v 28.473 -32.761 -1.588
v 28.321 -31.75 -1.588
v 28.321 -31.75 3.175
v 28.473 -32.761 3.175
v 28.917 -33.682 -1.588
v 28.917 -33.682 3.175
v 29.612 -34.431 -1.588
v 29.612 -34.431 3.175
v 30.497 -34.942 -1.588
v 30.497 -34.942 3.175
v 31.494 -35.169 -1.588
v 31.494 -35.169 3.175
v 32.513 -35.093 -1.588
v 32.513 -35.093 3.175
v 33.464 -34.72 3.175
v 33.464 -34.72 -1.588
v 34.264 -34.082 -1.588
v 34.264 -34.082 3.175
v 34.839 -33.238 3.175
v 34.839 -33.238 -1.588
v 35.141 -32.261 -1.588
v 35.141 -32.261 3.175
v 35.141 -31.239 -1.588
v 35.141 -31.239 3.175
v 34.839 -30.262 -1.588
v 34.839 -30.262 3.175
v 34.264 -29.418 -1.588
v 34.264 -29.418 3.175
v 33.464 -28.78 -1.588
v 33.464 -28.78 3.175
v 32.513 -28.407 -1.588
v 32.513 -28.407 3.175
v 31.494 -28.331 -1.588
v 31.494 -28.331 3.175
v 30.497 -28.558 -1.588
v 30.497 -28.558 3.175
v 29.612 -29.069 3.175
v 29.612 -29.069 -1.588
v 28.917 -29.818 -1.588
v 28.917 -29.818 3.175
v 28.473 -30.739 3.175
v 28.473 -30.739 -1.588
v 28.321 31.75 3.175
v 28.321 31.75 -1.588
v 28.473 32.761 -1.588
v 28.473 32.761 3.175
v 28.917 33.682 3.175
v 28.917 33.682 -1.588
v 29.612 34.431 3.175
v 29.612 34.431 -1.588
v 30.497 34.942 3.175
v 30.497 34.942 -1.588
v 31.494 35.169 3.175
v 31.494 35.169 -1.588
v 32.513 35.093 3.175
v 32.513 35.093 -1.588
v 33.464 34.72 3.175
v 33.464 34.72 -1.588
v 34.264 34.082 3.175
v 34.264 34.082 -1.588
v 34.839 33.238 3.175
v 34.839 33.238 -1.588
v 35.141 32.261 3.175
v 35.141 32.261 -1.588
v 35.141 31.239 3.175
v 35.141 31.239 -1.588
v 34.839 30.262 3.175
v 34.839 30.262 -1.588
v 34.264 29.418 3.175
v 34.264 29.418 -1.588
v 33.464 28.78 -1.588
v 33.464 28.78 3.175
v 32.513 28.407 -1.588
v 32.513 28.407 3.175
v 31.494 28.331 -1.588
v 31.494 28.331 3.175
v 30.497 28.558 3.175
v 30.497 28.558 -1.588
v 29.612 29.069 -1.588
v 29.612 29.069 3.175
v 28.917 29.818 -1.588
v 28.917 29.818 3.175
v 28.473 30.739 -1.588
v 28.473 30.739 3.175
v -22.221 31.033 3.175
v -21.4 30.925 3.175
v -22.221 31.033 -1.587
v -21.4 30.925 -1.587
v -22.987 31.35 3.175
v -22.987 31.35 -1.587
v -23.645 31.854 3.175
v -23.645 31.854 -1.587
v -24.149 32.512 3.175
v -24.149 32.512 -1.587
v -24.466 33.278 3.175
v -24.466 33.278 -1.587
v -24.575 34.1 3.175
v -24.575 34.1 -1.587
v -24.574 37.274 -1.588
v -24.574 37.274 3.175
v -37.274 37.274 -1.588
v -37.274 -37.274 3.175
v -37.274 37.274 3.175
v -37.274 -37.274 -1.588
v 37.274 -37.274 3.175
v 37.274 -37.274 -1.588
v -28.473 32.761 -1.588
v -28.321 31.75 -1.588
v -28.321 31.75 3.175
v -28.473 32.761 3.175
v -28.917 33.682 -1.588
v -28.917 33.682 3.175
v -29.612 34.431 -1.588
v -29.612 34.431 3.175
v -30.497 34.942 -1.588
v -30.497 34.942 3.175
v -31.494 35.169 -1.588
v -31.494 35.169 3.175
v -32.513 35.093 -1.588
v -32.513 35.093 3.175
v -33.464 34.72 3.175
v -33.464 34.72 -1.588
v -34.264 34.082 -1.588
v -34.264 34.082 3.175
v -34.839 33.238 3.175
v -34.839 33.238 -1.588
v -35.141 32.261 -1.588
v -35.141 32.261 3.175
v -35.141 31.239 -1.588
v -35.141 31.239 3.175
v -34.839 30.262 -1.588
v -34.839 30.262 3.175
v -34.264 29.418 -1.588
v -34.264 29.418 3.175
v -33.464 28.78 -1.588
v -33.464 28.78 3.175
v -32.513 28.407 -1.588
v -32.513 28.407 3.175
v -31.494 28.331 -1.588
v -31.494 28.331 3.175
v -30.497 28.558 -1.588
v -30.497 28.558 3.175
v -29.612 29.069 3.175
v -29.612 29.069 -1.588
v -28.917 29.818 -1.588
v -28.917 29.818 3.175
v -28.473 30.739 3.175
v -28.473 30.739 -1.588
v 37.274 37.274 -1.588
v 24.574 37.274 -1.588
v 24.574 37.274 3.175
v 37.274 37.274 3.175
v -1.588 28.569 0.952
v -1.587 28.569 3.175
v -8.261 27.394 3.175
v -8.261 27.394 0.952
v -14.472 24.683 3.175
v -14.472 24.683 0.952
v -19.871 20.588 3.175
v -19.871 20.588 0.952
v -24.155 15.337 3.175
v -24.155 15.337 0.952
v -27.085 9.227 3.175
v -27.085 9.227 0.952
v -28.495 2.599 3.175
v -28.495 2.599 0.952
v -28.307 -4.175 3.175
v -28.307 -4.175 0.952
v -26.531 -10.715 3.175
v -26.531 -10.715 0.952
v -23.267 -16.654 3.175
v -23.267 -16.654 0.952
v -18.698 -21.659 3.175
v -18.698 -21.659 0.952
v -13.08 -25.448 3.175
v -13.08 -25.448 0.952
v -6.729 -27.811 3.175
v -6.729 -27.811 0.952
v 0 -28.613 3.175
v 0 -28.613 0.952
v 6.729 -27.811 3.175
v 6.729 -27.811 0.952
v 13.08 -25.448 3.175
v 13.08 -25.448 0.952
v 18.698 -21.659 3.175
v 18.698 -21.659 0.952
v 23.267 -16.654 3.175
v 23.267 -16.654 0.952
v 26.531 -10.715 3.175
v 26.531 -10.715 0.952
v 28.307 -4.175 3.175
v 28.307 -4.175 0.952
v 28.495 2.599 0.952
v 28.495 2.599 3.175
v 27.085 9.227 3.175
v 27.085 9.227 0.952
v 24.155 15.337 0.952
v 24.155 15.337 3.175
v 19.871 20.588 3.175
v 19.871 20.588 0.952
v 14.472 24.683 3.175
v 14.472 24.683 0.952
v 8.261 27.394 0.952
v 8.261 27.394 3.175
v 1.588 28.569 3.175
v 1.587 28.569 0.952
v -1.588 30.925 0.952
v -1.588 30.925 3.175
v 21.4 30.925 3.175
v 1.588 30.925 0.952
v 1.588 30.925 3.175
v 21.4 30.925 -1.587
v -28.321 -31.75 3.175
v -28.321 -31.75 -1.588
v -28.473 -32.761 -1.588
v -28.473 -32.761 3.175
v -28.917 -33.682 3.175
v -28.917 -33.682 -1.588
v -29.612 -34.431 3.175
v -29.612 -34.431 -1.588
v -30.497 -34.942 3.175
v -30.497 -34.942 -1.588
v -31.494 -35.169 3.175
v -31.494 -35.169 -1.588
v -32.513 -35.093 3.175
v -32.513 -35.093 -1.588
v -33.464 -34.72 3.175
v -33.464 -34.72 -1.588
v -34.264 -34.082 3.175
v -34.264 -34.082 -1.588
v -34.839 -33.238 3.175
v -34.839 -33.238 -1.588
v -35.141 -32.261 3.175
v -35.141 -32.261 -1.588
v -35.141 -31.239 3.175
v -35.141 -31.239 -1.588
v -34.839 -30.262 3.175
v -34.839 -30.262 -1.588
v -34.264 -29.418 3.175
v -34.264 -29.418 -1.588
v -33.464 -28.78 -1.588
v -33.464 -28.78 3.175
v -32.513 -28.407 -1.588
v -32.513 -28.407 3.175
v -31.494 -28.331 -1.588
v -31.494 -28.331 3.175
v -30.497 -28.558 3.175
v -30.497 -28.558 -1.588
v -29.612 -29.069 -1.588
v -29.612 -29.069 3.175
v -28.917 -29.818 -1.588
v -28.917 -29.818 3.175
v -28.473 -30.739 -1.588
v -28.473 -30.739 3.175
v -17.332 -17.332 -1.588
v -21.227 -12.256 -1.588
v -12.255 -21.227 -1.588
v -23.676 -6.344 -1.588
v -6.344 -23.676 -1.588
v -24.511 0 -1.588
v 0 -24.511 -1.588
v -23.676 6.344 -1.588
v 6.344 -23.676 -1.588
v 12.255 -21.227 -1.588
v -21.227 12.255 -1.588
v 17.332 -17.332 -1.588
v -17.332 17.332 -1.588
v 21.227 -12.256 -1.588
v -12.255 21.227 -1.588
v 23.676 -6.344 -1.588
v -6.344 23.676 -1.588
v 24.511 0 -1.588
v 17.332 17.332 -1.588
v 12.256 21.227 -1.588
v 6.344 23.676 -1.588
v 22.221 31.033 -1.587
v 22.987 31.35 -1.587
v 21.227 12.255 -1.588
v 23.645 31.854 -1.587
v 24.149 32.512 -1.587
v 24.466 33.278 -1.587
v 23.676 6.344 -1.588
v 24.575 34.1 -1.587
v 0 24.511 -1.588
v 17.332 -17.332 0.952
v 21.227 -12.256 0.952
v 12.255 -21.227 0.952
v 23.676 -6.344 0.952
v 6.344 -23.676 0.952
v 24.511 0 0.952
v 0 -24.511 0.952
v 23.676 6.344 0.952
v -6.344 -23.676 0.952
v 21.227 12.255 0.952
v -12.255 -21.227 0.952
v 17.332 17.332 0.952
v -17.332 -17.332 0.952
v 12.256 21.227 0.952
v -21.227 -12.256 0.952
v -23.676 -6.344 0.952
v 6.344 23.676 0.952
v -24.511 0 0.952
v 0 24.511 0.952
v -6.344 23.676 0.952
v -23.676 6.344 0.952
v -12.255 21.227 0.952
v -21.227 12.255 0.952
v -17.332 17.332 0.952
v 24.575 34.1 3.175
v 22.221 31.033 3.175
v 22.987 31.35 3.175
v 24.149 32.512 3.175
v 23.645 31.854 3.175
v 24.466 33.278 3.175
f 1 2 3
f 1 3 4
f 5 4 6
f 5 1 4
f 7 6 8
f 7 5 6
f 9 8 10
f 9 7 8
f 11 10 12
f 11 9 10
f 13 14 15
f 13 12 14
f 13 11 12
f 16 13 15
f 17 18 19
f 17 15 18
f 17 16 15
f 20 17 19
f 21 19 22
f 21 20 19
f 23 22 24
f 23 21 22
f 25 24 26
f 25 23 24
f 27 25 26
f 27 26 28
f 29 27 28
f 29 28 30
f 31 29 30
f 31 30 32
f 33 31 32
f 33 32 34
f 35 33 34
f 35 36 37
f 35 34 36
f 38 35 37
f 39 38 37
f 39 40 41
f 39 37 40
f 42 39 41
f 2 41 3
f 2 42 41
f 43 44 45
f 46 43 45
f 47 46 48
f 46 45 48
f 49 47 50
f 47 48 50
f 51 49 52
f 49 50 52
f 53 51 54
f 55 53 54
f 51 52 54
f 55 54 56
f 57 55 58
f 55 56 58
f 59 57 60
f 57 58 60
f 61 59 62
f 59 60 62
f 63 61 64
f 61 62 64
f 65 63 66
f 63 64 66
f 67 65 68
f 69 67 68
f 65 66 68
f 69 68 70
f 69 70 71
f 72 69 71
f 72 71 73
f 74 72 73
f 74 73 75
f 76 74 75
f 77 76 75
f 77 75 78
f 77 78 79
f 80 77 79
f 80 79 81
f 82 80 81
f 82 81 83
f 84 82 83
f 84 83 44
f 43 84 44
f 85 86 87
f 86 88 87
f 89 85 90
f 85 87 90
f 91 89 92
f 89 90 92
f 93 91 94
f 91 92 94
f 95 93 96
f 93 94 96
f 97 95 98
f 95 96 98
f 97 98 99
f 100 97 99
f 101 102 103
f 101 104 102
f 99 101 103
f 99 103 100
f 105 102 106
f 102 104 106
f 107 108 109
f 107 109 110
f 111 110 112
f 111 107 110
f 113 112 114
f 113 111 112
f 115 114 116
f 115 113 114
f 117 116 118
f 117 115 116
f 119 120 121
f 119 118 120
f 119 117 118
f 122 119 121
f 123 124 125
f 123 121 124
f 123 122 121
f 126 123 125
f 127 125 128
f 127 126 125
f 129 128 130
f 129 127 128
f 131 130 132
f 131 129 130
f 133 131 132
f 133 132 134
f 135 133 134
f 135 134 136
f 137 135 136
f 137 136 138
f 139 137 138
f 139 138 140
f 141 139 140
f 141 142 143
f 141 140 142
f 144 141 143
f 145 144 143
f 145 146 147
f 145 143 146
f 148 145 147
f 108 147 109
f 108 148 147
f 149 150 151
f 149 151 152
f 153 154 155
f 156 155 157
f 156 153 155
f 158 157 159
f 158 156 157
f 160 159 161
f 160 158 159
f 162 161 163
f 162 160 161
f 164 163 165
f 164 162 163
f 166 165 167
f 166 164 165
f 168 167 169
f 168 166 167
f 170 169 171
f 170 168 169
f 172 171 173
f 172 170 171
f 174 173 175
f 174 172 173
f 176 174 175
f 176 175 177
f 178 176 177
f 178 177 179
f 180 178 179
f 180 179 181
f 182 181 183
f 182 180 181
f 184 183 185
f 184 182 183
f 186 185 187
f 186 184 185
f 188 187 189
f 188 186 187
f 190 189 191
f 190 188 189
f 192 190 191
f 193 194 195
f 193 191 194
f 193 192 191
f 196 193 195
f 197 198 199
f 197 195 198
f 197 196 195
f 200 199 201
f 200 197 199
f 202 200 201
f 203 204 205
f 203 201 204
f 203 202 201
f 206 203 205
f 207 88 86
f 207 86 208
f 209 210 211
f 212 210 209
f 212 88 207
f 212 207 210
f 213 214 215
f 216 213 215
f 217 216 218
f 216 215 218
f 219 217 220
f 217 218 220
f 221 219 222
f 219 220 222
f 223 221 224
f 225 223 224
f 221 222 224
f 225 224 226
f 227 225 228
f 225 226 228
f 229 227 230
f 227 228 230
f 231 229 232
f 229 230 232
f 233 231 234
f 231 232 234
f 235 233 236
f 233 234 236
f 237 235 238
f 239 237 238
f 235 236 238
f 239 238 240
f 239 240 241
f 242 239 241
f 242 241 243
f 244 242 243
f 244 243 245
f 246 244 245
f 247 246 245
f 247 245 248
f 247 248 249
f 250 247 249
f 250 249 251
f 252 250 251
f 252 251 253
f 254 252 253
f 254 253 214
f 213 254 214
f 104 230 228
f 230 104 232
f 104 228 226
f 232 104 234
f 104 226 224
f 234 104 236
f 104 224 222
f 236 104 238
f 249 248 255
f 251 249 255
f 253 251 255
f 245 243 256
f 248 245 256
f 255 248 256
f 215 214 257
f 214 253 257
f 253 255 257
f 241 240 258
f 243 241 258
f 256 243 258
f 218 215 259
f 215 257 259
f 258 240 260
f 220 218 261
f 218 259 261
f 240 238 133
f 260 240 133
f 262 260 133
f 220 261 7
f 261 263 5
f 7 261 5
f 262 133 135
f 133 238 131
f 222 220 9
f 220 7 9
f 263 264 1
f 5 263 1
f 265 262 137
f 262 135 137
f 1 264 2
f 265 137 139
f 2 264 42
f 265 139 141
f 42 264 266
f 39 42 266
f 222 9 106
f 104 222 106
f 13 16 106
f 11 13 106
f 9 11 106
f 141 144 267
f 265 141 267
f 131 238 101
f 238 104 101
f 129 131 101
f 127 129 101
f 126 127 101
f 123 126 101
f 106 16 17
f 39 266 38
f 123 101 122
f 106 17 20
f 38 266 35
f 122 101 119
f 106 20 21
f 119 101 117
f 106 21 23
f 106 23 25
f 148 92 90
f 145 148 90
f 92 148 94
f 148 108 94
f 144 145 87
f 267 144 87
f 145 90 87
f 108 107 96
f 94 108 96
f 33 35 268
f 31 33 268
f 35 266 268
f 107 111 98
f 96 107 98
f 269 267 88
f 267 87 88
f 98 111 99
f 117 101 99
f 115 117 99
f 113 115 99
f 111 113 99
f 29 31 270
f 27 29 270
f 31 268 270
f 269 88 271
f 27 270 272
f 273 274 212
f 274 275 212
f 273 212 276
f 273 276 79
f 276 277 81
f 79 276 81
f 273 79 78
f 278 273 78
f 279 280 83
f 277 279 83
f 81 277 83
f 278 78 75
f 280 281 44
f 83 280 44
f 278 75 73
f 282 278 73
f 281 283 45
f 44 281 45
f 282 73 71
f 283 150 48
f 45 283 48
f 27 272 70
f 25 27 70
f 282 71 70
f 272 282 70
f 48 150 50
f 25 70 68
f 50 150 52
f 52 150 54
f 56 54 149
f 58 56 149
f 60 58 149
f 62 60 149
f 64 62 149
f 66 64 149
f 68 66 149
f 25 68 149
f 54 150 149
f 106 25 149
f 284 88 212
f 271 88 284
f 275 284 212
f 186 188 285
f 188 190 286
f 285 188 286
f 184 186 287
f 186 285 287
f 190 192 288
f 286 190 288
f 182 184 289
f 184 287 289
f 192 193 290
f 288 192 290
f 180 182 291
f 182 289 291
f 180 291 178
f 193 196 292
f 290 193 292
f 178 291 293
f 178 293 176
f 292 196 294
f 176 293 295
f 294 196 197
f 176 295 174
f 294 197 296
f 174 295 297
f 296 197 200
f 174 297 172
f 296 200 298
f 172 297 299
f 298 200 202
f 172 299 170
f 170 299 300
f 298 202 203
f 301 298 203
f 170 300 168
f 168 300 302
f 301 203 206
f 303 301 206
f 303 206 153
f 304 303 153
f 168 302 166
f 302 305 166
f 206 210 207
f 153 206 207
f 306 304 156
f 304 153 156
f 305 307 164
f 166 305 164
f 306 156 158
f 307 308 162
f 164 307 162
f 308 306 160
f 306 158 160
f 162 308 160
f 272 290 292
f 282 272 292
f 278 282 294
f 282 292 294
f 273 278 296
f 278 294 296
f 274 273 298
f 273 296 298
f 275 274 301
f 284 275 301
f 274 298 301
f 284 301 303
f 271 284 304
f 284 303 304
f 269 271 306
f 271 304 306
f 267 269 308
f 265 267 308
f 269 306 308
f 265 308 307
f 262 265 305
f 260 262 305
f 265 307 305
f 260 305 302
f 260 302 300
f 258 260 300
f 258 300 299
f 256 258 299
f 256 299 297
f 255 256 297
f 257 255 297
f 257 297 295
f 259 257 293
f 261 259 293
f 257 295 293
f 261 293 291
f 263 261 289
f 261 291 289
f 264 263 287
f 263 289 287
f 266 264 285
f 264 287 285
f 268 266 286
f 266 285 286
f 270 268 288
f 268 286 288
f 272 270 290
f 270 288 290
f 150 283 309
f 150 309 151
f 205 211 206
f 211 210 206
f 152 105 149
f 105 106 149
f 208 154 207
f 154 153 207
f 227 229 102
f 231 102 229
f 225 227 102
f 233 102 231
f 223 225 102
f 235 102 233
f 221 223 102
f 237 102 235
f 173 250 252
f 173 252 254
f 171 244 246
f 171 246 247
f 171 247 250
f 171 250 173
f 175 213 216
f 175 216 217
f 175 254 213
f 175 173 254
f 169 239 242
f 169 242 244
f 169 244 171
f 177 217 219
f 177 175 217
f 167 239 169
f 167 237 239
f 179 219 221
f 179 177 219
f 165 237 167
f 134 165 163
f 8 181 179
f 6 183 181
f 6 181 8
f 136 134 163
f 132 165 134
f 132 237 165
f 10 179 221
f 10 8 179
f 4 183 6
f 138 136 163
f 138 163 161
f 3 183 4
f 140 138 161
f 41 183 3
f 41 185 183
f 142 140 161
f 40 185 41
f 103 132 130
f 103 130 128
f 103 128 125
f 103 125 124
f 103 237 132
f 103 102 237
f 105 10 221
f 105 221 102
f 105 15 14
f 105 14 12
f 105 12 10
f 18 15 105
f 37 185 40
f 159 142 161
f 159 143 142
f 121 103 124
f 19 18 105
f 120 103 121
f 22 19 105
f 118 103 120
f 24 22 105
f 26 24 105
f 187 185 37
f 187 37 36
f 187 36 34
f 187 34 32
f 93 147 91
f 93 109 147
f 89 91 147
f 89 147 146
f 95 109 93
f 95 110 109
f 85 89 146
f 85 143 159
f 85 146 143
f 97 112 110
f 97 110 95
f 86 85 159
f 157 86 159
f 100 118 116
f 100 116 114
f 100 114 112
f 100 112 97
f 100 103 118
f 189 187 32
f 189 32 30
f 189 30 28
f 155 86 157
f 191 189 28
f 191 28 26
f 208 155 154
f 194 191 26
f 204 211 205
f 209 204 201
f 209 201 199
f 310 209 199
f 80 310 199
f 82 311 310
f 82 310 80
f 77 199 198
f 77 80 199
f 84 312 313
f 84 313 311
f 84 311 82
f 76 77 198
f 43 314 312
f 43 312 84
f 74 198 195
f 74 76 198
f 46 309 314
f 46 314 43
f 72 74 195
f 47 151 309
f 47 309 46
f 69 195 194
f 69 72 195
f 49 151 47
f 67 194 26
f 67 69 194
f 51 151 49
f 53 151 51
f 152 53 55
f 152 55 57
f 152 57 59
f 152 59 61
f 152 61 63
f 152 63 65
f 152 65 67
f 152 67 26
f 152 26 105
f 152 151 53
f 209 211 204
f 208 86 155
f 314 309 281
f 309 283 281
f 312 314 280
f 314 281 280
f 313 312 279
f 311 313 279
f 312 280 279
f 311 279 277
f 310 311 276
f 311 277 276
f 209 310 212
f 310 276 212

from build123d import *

# Parameters (mm, degrees)
SKETCH1_W                      = 74.549
SKETCH1_H                      = 74.549
SKETCH1_R                      = 24.511
BOSS_EXTRUDE1_DEPTH            = 1.5875
BOSS_EXTRUDE1_DEPTH_BACK       = 1.5875
SKETCH15_W                     = 74.549
SKETCH15_H                     = 74.549
SKETCH15_R                     = 28.6131
BOSS_EXTRUDE11_DEPTH           = 1.5875
CUT_EXTRUDE1_START             = -4.175
SKETCH2_R                      = 3.429
CUT_EXTRUDE1_DEPTH             = 6.7625
MIRROR2_START                  = -4.175
MIRROR2_COPY_1_SKETCH_R        = 3.429
MIRROR2_COPY_1_DEPTH           = 6.7625
SKETCH14_W                     = 49.149
SKETCH14_H                     = 8.290530285
CUT_EXTRUDE6_DEPTH             = 2.5875
CUT_EXTRUDE6_DEPTH_BACK        = 4.175
FILLET2_R                      = 3.175
CUT_EXTRUDE8_REACH             = 3.587
CUT_EXTRUDE8_DIRECTION_2_DEPTH = 0.635
SKETCH18_R                     = 28.6131
CUT_EXTRUDE9_DEPTH             = 0.635


with BuildPart() as part:
    # Sketch1 → Boss-Extrude1 (new body, two sides)
    with BuildSketch(Plane.XY) as boss_extrude1_sk:
        Rectangle(SKETCH1_W, SKETCH1_H)
        Circle(SKETCH1_R, mode=Mode.SUBTRACT)
    extrude(amount=BOSS_EXTRUDE1_DEPTH)
    extrude(boss_extrude1_sk.sketch, amount=-BOSS_EXTRUDE1_DEPTH_BACK)

    # Sketch15 → Boss-Extrude11 (add)
    with BuildSketch(Plane.XY.offset(1.5875)):
        Rectangle(SKETCH15_W, SKETCH15_H)
        Circle(SKETCH15_R, mode=Mode.SUBTRACT)
    extrude(amount=BOSS_EXTRUDE11_DEPTH)

    # Sketch2 → Cut-Extrude1 (cut)
    with BuildSketch(Plane.XY.offset(1.5875).offset(CUT_EXTRUDE1_START)):
        with Locations((-31.75, 31.75)):
            Circle(SKETCH2_R)
    cut_extrude1 = extrude(amount=CUT_EXTRUDE1_DEPTH, mode=Mode.SUBTRACT)

    # Mirror1: Cut-Extrude1 across plane
    add(cut_extrude1.mirror(Plane(origin=(0, 0, 0), x_dir=(0, 0, 1), z_dir=(1, 0, 0))), mode=Mode.SUBTRACT)

    # Mirror2: Cut-Extrude1 across plane
    add(cut_extrude1.mirror(Plane.ZX), mode=Mode.SUBTRACT)

    # Mirror2 copy 1 sketch → Mirror2 copy 1 (cut)
    with BuildSketch(Plane(origin=(0, 0, 1.5875), x_dir=(-1, 0, 0), z_dir=(0, 0, 1)).offset(MIRROR2_START)):
        with Locations((-31.75, 31.75)):
            Circle(MIRROR2_COPY_1_SKETCH_R)
    extrude(amount=MIRROR2_COPY_1_DEPTH, mode=Mode.SUBTRACT)

    # Sketch14 → Cut-Extrude6 (cut, two sides)
    with BuildSketch(Plane.XY.offset(1.5875)) as cut_extrude6_sk:
        with Locations((0, 35.069765143)):
            Rectangle(SKETCH14_W, SKETCH14_H)
    extrude(amount=CUT_EXTRUDE6_DEPTH, mode=Mode.SUBTRACT)
    extrude(cut_extrude6_sk.sketch, amount=-CUT_EXTRUDE6_DEPTH_BACK, mode=Mode.SUBTRACT)

    # Fillet2
    fillet2_edges = [part.edges().sort_by_distance(p)[0] for p in [
        (-24.5745, 30.9245, 0.79375),
        (24.5745, 30.9245, 0.79375),
    ]]
    fillet(fillet2_edges, radius=FILLET2_R)

    # Sketch17 → Cut-Extrude8 (cut, up to next)
    with BuildSketch(Plane.XY.offset(1.5875), mode=Mode.PRIVATE) as cut_extrude8_sk1:
        with BuildLine():
            Line((-1.5875, 24.754637718), (-1.5875, 33.858616052))
            ThreePointArc((-1.5875, 33.858616052), (0, 35.446116052), (1.5875, 33.858616052))
            Line((1.5875, 33.858616052), (1.5875, 24.754637718))
            ThreePointArc((1.5875, 24.754637718), (0, 23.167137718), (-1.5875, 24.754637718))
        make_face()
    cut_extrude8_tool1 = extrude(cut_extrude8_sk1.sketch, amount=CUT_EXTRUDE8_REACH, mode=Mode.PRIVATE) & part.part
    add(cut_extrude8_tool1.solids().sort_by_distance((0, 29.306627, 1.5875))[0], mode=Mode.SUBTRACT)

    # Sketch17 → Cut-Extrude8 direction 2 (cut)
    with BuildSketch(Plane.XY.offset(1.5875)):
        with BuildLine():
            Line((-1.5875, 24.754637718), (-1.5875, 33.858616052))
            ThreePointArc((-1.5875, 33.858616052), (0, 35.446116052), (1.5875, 33.858616052))
            Line((1.5875, 33.858616052), (1.5875, 24.754637718))
            ThreePointArc((1.5875, 24.754637718), (0, 23.167137718), (-1.5875, 24.754637718))
        make_face()
    extrude(amount=-CUT_EXTRUDE8_DIRECTION_2_DEPTH, mode=Mode.SUBTRACT)

    # Sketch18 → Cut-Extrude9 (cut)
    with BuildSketch(Plane.XY.offset(1.5875)):
        Circle(SKETCH18_R)
    extrude(amount=-CUT_EXTRUDE9_DEPTH, mode=Mode.SUBTRACT)


solid = part.part
